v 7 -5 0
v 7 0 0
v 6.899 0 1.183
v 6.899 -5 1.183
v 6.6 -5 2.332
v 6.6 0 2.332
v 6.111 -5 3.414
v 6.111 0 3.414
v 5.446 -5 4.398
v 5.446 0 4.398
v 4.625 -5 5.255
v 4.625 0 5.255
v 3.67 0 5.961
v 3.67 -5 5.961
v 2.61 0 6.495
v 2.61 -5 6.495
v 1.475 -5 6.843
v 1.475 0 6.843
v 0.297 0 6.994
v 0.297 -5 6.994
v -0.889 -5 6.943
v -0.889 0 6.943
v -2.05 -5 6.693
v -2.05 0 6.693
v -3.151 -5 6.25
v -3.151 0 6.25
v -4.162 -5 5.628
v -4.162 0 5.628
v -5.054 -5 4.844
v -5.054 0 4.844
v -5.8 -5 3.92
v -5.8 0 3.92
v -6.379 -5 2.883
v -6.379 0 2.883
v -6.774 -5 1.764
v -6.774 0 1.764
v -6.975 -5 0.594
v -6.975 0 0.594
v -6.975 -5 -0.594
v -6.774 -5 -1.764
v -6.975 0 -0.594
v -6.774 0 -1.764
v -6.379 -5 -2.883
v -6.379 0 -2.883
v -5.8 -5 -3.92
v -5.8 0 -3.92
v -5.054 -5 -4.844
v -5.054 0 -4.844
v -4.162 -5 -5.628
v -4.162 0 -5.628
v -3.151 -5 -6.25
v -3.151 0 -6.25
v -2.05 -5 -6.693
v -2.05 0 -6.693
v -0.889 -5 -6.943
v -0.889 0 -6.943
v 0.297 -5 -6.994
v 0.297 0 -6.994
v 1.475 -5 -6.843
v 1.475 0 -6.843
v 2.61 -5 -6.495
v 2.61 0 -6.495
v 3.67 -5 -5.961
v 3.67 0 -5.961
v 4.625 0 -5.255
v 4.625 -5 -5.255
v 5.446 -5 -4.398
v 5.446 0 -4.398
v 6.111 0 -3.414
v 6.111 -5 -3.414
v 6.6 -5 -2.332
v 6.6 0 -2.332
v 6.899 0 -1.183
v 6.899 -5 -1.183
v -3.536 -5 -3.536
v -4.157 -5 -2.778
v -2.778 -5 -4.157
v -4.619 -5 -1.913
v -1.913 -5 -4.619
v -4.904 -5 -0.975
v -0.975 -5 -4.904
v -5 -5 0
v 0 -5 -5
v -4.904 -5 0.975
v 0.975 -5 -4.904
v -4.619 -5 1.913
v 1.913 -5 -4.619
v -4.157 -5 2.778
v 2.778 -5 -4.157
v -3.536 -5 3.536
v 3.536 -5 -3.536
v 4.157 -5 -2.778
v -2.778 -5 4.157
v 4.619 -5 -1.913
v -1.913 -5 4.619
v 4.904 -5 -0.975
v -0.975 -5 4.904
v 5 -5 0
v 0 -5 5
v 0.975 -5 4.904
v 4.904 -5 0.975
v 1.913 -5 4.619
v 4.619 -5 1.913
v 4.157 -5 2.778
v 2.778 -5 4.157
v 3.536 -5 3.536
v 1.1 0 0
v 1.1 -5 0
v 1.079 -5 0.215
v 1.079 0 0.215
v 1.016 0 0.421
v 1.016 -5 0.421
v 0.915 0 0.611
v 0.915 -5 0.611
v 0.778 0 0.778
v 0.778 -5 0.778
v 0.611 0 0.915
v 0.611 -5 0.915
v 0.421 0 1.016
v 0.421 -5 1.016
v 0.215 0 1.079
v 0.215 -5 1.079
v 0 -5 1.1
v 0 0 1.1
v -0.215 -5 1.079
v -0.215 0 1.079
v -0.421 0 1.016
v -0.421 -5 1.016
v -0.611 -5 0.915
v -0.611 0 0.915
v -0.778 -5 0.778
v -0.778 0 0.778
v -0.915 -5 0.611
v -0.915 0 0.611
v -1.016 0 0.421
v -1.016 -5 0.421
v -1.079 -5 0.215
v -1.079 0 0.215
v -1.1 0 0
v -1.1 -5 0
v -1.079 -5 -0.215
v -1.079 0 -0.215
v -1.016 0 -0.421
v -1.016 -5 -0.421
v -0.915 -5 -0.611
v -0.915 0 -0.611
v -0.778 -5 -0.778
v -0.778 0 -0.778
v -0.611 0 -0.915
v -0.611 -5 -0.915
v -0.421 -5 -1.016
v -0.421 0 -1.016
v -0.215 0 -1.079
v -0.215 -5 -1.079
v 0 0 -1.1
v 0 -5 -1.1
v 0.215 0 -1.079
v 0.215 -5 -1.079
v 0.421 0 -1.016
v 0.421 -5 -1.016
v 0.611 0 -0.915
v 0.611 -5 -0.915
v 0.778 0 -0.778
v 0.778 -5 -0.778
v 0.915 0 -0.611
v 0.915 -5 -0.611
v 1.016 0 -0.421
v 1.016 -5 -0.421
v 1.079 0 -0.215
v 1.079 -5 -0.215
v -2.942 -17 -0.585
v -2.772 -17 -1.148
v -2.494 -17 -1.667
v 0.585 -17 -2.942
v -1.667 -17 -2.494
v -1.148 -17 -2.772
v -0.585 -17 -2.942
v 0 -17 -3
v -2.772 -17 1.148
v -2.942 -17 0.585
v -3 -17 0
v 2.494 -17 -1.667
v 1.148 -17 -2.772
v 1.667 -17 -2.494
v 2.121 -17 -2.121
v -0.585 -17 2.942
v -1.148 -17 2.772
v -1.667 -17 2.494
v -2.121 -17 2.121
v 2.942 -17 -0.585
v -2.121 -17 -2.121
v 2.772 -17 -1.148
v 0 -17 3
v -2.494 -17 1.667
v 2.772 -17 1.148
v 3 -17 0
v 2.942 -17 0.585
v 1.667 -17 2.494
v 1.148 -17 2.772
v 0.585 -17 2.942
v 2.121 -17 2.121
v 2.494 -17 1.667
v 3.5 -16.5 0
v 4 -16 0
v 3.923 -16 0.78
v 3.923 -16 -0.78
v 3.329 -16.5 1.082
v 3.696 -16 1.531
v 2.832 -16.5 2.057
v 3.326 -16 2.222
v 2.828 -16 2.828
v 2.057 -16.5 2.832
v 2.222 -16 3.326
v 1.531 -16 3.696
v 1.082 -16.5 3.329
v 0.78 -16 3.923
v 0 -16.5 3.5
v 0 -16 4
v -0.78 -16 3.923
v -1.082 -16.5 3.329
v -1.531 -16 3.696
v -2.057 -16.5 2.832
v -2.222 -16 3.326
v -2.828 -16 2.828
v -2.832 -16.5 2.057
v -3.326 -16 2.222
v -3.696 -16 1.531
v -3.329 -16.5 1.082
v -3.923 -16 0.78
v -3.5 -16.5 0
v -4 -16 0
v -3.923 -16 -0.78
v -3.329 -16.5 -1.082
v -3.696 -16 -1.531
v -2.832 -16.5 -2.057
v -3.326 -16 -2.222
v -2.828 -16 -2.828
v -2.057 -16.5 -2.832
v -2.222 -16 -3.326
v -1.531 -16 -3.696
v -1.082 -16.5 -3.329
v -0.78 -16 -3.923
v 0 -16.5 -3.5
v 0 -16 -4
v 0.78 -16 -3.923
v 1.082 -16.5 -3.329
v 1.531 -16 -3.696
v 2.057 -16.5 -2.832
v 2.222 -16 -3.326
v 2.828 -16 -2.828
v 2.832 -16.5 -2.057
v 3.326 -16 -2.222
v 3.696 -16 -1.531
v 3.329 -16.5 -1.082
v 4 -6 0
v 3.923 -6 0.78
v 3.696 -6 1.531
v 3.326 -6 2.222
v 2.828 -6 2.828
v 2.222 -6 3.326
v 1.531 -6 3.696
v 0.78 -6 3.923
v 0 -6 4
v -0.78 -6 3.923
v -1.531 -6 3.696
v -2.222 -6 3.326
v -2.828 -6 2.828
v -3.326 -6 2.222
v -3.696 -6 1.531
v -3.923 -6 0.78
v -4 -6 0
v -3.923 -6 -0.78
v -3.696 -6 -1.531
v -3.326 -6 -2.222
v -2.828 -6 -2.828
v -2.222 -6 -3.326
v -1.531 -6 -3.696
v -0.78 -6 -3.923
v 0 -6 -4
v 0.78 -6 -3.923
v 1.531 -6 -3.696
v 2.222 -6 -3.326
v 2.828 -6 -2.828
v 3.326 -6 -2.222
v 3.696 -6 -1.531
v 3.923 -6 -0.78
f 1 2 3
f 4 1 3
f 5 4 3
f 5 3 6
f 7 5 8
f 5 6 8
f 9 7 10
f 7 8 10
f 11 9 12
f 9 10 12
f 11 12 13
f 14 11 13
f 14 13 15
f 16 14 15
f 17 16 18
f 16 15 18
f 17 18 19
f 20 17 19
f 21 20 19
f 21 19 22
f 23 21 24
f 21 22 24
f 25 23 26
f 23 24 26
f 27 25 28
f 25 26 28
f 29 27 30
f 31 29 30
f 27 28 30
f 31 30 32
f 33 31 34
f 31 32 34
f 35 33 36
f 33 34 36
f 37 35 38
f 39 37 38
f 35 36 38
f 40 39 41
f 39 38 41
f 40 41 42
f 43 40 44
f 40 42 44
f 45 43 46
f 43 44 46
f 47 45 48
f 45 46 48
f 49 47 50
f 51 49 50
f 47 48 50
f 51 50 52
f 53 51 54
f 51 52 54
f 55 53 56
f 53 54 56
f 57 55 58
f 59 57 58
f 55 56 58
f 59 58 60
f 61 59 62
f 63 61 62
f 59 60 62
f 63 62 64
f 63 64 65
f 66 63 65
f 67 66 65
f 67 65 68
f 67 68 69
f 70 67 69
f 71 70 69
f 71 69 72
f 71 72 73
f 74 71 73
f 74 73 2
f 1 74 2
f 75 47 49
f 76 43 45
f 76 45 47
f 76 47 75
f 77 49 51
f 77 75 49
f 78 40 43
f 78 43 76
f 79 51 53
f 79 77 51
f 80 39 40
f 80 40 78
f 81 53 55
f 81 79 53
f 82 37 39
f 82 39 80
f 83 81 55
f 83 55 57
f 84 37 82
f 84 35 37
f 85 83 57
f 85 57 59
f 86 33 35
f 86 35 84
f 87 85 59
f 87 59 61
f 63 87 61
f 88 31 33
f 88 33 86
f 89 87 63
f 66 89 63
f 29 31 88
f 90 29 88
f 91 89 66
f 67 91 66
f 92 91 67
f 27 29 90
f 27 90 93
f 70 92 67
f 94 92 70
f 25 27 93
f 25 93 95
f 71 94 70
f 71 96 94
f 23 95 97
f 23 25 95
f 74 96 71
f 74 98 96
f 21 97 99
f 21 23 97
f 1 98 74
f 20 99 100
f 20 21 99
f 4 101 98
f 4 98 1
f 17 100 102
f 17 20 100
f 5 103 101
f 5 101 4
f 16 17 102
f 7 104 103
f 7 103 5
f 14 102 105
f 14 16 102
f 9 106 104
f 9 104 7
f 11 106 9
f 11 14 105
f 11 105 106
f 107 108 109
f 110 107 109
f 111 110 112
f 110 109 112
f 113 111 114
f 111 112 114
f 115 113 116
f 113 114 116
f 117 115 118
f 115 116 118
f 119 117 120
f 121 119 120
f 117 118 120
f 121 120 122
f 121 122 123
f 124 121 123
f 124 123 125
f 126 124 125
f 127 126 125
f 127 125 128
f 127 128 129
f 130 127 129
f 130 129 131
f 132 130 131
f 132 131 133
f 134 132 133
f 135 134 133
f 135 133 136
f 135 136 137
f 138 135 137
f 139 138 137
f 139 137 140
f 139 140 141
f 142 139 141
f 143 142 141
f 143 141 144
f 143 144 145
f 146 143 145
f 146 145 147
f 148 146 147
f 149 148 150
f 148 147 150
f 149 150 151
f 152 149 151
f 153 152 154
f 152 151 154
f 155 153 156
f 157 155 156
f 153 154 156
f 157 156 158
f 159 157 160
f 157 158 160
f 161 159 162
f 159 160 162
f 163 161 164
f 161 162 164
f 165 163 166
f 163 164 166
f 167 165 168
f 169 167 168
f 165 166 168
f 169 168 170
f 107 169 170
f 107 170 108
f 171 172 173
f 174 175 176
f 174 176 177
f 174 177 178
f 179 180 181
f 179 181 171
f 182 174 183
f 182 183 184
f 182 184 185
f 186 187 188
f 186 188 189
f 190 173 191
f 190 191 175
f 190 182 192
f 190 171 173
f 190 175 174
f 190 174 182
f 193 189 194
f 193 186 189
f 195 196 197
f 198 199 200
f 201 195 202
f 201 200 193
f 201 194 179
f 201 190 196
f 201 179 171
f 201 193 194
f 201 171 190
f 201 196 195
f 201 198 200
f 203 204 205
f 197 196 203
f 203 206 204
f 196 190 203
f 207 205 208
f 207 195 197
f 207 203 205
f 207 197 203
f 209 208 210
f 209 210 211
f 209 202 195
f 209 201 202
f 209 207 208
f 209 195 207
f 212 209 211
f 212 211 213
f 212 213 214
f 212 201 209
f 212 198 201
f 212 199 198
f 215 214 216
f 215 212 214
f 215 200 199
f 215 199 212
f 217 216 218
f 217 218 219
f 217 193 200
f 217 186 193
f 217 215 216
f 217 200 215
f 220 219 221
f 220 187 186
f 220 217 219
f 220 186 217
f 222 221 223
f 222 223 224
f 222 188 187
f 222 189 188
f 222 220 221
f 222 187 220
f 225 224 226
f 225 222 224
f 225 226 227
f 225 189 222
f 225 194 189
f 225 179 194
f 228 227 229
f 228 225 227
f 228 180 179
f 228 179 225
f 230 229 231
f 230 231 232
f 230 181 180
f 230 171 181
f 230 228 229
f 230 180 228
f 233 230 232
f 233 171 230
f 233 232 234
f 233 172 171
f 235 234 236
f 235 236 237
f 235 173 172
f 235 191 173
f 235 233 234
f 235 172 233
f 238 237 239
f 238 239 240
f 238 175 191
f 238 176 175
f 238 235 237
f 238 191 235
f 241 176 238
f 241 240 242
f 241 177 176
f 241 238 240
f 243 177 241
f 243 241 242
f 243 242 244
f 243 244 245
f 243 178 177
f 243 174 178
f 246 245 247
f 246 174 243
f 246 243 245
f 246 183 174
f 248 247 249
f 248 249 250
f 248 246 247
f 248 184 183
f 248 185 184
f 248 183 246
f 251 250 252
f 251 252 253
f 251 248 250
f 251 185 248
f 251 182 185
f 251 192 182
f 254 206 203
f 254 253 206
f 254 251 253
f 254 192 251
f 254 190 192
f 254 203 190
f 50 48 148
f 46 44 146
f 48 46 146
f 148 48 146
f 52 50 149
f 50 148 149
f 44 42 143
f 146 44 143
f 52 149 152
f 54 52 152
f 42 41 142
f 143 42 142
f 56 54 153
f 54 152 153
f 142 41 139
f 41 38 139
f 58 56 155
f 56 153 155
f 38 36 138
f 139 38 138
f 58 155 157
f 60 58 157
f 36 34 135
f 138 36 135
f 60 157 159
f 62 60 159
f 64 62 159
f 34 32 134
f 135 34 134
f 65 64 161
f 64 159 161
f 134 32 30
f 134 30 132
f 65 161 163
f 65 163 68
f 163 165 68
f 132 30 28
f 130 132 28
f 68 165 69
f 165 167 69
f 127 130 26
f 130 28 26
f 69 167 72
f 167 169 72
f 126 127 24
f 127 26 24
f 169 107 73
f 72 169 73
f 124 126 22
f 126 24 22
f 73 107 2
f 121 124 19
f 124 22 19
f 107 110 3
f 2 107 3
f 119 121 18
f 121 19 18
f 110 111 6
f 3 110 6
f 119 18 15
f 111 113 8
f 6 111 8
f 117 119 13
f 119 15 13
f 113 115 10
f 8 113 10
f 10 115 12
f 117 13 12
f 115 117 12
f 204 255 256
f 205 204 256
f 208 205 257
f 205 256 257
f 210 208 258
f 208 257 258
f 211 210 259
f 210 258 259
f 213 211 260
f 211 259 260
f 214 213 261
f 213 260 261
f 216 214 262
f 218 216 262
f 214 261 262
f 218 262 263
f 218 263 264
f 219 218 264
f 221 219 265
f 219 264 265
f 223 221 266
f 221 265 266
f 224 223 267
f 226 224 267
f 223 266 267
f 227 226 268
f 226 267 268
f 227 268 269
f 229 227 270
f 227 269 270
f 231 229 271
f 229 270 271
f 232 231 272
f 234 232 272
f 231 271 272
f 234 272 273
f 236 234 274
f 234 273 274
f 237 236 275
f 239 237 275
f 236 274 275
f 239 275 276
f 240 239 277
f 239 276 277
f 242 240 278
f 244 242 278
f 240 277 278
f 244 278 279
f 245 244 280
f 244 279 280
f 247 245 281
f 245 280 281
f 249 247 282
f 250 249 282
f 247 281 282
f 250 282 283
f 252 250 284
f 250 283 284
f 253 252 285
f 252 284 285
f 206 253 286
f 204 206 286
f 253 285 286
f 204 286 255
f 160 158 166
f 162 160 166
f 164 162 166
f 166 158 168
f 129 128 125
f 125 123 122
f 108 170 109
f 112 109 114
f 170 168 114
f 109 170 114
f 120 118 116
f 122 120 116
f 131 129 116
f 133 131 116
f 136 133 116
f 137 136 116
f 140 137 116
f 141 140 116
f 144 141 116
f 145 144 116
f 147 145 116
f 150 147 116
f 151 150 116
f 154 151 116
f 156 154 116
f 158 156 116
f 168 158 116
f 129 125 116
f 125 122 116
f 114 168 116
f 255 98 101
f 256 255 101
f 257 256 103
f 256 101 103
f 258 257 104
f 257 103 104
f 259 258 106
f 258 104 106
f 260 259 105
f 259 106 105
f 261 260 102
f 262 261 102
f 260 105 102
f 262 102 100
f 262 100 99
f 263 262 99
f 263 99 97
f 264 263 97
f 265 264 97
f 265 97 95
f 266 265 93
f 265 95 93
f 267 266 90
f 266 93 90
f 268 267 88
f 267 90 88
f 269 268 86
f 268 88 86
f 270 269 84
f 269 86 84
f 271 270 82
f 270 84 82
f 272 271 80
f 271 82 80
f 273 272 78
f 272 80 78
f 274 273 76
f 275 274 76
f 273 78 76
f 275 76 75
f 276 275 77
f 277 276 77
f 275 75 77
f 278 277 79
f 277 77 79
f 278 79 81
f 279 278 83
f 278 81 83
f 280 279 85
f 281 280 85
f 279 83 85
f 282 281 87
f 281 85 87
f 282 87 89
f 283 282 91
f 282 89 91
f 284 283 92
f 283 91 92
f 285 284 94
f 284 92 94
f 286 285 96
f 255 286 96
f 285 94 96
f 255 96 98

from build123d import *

# Parameters (mm, degrees)
F0_R     = 7
F1_DEPTH = 5
F2_R     = 1.1
F3_DEPTH = 5.001
F4_R     = 4
F5_DEPTH = 12
F6_SIZE  = 1


with BuildPart() as f1:
    # F0 (on Front) → F1 (new body)
    with BuildSketch(Plane.XZ):
        Circle(F0_R)
    extrude(amount=F1_DEPTH)

    # F2 (on face) → F3 (cut, through all)
    with BuildSketch(Plane.XZ.offset(5)):
        Circle(F2_R)
    extrude(amount=-F3_DEPTH, mode=Mode.SUBTRACT)

    # F4 (on face) → F5 (join)
    with BuildSketch(Plane.XZ.offset(5)):
        Circle(F4_R)
    extrude(amount=F5_DEPTH)

    # F6
    f6_edges = [f1.edges().sort_by_distance(p)[0] for p in [
        (-4, -17, 0),
        (-4, -5, 0),
    ]]
    chamfer(f6_edges, length=F6_SIZE)


solid = f1.part
